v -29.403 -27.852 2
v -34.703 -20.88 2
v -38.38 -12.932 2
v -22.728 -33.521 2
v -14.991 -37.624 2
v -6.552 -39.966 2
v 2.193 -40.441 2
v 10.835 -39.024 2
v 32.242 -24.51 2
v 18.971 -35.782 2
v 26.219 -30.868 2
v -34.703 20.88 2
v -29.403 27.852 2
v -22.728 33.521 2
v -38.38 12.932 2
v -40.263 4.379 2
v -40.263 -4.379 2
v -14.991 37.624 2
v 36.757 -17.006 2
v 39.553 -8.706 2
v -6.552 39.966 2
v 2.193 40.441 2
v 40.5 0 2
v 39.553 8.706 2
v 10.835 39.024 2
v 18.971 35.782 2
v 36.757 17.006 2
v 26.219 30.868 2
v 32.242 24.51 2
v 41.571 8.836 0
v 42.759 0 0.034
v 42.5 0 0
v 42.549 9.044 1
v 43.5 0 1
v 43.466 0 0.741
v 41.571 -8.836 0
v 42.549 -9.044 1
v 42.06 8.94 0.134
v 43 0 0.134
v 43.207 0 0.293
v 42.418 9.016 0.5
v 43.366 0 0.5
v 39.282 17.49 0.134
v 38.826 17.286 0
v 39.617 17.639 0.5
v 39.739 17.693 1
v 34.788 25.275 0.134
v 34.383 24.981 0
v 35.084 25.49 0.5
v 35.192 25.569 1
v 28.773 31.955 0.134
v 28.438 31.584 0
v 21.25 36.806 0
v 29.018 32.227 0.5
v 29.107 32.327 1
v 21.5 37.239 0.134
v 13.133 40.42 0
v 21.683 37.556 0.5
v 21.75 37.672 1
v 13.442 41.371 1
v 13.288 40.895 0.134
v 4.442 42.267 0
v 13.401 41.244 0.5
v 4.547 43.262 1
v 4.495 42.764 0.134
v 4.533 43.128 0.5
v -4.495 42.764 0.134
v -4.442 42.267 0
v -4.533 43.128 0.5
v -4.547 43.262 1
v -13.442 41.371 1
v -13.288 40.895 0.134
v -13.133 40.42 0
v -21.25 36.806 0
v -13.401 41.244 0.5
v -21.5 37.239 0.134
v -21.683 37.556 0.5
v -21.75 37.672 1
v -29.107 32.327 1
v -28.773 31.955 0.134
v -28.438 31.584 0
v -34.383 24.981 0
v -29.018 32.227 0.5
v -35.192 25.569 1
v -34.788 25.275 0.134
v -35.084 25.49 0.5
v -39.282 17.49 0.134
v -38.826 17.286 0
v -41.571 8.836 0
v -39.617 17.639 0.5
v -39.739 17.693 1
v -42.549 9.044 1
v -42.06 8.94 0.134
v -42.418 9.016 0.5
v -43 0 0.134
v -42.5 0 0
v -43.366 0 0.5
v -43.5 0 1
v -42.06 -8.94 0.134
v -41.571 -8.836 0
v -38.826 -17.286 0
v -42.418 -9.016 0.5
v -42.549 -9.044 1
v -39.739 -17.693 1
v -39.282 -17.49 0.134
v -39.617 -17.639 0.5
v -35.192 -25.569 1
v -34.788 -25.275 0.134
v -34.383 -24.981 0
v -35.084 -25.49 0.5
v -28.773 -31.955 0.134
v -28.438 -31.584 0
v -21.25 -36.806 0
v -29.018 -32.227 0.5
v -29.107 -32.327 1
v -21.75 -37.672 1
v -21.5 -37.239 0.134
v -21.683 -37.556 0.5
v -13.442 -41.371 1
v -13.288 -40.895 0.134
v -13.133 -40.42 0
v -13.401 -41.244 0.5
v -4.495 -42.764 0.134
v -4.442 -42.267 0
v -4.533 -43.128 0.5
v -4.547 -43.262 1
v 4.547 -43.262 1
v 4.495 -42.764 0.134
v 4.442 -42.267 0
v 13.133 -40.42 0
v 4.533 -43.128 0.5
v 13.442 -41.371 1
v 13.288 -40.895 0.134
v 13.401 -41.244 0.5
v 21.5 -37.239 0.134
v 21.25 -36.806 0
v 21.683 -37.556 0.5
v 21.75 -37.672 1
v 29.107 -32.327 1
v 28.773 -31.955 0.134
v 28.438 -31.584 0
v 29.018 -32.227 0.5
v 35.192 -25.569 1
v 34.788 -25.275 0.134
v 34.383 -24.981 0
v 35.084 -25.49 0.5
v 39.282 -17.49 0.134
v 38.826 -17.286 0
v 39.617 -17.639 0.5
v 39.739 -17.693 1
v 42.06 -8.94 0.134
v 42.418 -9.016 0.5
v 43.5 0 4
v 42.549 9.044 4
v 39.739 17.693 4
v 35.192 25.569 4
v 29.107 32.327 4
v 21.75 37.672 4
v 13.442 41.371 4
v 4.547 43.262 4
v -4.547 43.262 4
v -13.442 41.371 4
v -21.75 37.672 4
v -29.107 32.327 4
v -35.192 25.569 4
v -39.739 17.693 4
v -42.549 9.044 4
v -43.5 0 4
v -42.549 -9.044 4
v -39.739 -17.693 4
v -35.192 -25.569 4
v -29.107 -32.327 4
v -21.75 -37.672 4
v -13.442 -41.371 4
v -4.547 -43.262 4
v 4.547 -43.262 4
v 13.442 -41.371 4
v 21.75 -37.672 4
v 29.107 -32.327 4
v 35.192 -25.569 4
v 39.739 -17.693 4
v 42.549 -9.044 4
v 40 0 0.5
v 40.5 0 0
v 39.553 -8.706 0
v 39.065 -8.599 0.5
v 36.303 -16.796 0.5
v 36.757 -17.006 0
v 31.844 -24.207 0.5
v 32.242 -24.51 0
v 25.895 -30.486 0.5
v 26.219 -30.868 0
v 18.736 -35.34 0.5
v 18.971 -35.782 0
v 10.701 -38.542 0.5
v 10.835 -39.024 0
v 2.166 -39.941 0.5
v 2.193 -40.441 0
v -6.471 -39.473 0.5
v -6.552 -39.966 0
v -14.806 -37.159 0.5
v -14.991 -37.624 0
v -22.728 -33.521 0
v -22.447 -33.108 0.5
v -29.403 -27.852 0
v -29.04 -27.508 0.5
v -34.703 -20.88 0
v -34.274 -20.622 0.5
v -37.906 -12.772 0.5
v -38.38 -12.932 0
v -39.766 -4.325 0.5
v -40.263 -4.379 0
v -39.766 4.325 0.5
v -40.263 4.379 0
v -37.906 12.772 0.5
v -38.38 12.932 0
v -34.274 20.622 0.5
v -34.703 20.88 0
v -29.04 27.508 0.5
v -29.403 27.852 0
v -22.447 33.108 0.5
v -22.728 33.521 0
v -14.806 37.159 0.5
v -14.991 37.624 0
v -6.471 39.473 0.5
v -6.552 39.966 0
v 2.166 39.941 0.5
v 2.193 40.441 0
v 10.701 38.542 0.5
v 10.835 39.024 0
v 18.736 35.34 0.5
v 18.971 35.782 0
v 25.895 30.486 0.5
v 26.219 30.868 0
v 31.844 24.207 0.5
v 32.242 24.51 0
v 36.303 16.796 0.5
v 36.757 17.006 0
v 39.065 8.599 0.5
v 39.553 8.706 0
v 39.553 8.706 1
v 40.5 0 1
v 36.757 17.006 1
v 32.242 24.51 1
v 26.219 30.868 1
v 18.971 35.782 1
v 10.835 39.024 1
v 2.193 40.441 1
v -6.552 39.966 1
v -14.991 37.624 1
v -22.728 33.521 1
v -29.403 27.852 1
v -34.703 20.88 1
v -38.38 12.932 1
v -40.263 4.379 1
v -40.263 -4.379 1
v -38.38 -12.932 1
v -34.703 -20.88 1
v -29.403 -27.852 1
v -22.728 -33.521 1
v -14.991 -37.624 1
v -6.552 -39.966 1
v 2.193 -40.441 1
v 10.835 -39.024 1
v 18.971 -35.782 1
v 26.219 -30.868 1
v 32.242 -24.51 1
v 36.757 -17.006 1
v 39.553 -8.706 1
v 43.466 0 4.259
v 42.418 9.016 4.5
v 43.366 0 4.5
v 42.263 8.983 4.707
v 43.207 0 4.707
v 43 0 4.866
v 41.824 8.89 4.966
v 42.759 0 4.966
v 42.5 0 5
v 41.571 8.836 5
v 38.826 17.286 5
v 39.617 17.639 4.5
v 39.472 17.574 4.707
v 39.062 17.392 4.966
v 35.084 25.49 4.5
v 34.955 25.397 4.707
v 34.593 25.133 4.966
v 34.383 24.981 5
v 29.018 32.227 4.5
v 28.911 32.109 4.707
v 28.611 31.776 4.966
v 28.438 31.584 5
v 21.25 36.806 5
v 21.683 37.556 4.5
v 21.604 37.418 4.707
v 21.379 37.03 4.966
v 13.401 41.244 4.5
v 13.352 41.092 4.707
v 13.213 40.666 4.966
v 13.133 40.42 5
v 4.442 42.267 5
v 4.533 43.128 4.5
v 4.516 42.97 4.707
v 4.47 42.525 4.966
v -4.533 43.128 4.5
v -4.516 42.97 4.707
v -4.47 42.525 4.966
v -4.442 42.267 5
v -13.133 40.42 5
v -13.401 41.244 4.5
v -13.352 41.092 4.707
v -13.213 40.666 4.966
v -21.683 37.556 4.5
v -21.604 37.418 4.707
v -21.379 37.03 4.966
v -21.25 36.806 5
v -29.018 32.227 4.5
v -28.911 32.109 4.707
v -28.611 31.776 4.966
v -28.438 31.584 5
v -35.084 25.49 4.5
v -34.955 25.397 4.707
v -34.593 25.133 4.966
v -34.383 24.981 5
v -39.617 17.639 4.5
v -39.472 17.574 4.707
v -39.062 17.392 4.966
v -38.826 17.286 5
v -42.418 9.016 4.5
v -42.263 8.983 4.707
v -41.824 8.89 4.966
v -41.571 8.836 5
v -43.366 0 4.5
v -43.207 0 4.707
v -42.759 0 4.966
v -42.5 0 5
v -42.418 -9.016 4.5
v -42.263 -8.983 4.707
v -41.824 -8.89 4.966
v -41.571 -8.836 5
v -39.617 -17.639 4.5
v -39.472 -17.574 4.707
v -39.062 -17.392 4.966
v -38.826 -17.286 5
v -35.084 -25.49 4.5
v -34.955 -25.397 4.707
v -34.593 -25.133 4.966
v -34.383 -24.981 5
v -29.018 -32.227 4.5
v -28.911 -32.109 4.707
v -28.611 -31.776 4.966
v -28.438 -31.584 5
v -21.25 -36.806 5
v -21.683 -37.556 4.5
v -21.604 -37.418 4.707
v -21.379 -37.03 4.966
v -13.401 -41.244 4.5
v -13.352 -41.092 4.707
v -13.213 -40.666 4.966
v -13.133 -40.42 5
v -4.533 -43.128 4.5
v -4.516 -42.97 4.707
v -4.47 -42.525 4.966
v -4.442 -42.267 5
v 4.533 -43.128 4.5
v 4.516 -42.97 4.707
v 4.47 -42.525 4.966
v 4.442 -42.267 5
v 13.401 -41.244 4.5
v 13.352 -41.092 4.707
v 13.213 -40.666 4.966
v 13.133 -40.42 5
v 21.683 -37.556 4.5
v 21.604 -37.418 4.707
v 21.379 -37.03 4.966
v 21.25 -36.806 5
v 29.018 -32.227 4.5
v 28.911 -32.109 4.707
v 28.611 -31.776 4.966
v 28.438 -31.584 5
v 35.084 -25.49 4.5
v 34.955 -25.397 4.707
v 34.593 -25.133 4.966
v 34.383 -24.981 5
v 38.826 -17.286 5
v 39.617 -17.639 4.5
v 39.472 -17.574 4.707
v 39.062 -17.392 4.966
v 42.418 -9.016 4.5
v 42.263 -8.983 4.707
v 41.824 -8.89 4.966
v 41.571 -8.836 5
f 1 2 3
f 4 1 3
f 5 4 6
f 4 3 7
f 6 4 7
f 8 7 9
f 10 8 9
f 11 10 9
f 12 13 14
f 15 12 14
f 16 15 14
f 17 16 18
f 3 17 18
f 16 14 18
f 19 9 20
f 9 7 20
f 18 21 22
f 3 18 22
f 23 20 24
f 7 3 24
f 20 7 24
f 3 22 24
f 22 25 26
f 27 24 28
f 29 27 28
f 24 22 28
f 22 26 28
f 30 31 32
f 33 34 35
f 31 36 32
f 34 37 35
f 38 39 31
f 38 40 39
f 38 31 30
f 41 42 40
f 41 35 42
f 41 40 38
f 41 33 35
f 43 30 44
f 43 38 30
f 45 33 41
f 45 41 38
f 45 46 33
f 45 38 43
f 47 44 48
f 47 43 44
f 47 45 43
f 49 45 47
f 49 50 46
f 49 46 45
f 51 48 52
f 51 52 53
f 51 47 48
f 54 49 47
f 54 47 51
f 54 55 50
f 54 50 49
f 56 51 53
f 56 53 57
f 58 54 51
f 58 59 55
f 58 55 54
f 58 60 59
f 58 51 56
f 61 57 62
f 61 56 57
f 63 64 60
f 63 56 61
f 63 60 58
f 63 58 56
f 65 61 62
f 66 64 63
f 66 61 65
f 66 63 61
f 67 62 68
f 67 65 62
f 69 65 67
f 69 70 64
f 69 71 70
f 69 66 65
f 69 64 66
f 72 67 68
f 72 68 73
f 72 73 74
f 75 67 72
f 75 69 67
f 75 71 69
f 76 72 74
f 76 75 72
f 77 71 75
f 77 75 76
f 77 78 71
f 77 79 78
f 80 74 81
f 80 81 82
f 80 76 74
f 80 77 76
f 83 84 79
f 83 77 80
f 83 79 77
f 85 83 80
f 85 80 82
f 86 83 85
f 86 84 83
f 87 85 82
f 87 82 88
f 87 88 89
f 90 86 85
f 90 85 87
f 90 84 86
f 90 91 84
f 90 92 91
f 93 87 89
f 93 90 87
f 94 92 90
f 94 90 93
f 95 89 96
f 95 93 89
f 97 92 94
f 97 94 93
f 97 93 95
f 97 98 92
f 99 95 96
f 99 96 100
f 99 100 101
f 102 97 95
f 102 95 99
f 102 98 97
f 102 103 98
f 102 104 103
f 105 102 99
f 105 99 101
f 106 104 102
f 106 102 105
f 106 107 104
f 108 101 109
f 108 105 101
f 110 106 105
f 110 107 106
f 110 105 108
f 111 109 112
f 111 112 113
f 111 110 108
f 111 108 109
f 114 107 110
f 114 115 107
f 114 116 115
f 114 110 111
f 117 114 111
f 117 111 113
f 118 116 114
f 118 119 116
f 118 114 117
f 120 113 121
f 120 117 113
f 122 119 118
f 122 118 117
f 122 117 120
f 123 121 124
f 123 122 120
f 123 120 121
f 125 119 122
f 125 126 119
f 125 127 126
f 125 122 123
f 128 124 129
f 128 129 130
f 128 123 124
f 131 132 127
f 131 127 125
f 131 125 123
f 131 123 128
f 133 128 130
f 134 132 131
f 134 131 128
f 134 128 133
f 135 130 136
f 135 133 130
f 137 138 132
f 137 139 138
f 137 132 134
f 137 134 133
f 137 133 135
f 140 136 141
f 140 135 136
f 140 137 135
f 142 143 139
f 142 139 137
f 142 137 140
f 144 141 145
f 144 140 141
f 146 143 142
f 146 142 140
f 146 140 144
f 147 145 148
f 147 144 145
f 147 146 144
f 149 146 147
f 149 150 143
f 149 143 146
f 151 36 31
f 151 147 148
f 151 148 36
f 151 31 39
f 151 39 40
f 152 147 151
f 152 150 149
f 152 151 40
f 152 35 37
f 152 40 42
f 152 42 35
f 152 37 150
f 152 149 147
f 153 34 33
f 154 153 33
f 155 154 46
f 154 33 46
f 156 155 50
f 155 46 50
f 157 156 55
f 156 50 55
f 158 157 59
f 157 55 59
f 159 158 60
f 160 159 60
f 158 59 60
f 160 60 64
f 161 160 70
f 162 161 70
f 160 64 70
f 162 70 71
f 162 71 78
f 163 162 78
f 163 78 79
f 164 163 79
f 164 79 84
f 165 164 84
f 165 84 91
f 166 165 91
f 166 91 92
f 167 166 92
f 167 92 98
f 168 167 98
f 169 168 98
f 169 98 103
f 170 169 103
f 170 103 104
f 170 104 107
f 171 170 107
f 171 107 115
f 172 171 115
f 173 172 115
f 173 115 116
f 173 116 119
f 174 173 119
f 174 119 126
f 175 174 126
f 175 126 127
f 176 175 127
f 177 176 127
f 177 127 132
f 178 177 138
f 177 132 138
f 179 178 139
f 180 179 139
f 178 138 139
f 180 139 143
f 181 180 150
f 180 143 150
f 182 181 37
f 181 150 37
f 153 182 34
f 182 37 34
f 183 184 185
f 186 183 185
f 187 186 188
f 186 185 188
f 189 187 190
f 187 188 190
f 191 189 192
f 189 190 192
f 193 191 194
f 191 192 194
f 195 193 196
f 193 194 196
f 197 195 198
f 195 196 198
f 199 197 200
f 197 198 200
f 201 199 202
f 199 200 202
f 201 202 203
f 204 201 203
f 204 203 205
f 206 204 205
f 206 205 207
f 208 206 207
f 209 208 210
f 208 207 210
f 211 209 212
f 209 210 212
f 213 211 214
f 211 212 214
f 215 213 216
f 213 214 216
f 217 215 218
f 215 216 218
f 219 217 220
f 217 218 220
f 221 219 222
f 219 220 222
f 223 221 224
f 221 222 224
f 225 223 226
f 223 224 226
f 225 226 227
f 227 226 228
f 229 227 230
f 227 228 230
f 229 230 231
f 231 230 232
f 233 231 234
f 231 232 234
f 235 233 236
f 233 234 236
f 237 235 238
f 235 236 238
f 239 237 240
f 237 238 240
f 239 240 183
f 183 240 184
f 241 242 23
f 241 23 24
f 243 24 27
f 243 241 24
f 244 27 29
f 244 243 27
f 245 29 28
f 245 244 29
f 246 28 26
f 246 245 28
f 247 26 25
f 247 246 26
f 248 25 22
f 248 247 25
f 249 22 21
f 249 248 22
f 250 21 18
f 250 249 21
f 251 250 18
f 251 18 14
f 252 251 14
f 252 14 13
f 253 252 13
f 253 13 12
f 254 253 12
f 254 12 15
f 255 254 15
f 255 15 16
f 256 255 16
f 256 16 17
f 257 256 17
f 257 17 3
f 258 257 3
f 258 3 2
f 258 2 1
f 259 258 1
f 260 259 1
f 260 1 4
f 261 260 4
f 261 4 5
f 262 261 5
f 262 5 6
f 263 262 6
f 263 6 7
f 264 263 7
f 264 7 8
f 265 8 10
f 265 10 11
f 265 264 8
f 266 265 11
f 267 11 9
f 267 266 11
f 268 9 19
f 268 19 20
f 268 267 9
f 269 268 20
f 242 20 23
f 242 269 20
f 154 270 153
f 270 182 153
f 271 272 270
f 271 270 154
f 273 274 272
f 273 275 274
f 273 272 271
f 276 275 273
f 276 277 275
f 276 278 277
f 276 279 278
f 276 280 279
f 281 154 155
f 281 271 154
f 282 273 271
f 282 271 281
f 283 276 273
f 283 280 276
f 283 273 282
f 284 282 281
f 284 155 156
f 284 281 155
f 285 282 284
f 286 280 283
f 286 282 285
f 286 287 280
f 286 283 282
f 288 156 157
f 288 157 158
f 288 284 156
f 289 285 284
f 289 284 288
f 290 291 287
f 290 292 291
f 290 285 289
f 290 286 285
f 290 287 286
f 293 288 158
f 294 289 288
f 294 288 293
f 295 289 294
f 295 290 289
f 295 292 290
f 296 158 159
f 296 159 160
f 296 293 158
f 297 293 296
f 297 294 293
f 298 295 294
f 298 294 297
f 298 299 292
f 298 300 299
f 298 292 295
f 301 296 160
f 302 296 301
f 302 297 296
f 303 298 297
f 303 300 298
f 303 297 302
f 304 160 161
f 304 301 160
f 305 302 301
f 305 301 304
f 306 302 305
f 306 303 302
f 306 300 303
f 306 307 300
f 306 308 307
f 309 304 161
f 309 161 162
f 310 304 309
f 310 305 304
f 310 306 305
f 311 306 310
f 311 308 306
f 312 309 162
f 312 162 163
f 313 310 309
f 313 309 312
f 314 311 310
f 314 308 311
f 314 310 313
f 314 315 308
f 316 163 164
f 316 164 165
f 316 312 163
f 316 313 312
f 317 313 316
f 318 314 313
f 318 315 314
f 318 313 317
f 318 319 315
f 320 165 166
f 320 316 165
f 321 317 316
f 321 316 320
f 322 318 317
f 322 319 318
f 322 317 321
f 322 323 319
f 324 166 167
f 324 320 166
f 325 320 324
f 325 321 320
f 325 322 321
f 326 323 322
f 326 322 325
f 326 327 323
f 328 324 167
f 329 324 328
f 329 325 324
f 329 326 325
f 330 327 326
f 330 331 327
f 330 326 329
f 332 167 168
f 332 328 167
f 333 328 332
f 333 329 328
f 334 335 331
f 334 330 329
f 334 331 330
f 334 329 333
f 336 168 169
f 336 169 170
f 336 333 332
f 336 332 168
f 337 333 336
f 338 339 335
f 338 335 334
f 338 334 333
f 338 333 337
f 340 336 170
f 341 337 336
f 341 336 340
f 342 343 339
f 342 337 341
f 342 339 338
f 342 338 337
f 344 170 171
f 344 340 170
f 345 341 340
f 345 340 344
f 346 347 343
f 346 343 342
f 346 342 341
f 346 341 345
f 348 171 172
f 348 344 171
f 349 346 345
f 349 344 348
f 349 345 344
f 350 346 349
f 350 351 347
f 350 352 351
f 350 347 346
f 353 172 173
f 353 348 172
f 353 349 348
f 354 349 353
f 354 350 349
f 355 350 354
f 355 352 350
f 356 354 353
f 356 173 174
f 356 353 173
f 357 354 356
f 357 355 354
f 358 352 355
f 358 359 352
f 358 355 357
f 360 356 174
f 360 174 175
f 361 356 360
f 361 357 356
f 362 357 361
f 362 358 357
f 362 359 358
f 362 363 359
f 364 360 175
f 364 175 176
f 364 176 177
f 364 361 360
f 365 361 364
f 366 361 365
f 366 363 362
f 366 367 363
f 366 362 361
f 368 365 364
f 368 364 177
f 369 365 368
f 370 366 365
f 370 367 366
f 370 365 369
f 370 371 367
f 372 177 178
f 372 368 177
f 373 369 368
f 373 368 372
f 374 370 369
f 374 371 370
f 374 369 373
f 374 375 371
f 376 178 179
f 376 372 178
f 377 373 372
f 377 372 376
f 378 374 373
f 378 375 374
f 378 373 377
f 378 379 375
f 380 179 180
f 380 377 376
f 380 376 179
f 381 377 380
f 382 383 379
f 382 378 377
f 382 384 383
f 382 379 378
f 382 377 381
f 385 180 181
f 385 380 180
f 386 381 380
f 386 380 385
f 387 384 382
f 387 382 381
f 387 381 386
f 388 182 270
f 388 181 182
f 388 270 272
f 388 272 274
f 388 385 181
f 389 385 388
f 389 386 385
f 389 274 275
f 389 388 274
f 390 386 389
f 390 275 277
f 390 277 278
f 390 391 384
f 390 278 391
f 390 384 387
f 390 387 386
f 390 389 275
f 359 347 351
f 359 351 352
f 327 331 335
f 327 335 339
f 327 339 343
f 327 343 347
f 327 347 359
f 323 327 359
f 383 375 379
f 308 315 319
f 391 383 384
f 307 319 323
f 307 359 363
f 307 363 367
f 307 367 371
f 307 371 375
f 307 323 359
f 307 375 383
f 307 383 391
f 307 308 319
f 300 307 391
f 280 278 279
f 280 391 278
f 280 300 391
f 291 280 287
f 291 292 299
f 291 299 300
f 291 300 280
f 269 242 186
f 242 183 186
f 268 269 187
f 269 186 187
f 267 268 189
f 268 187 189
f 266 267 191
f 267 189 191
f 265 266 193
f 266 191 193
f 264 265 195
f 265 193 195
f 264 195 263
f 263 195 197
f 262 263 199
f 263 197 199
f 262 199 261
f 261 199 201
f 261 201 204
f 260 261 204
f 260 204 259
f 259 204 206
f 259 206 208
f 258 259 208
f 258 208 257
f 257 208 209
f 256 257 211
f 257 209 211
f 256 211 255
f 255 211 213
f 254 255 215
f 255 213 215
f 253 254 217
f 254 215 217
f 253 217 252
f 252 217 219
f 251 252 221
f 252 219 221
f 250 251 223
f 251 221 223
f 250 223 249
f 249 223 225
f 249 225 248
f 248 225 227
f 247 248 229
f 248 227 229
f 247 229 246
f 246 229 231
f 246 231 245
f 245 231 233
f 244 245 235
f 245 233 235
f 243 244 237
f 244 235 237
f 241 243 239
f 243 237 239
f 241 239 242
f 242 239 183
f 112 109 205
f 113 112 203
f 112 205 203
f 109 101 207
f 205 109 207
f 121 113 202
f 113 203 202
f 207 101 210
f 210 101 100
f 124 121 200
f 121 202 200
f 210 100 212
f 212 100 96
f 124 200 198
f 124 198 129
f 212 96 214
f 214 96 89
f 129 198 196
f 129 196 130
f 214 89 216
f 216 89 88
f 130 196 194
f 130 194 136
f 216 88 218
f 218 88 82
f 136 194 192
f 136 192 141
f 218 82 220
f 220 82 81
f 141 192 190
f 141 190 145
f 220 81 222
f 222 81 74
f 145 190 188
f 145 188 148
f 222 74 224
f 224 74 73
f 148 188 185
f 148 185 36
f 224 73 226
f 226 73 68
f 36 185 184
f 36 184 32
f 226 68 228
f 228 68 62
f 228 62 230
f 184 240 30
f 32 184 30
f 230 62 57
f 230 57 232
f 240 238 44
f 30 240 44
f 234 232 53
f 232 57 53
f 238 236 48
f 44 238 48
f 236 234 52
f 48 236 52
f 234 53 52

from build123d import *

# Parameters (mm, degrees)
F0_R     = 43.5
F0_R_2   = 40.5
F1_DEPTH = 2
F2_R     = 43.5
F3_DEPTH = 3
F6_R     = 1


with BuildPart() as f1:
    # F0 (on Top) → F1 (new body)
    with BuildSketch(Plane.XY):
        Circle(F0_R)
        Circle(F0_R_2, mode=Mode.SUBTRACT)
    extrude(amount=F1_DEPTH)

    # F2 (on face) → F3 (join)
    with BuildSketch(Plane.XY.offset(2)):
        Circle(F2_R)
    extrude(amount=F3_DEPTH)

    # F4 (on Front) → F5 (revolve)
    with BuildSketch(Plane.XZ):
        Polygon((40, 0.5), (40.5, 0), (40.5, 1), align=None)
    revolve(axis=Axis((0, 0, -3.5082), (0, 0, -1)))

    # F6
    f6_edges = [f1.edges().sort_by_distance(p)[0] for p in [
        (-43.5, 0, 5),
        (-43.5, 0, 0),
    ]]
    fillet(f6_edges, radius=F6_R)


solid = f1.part
